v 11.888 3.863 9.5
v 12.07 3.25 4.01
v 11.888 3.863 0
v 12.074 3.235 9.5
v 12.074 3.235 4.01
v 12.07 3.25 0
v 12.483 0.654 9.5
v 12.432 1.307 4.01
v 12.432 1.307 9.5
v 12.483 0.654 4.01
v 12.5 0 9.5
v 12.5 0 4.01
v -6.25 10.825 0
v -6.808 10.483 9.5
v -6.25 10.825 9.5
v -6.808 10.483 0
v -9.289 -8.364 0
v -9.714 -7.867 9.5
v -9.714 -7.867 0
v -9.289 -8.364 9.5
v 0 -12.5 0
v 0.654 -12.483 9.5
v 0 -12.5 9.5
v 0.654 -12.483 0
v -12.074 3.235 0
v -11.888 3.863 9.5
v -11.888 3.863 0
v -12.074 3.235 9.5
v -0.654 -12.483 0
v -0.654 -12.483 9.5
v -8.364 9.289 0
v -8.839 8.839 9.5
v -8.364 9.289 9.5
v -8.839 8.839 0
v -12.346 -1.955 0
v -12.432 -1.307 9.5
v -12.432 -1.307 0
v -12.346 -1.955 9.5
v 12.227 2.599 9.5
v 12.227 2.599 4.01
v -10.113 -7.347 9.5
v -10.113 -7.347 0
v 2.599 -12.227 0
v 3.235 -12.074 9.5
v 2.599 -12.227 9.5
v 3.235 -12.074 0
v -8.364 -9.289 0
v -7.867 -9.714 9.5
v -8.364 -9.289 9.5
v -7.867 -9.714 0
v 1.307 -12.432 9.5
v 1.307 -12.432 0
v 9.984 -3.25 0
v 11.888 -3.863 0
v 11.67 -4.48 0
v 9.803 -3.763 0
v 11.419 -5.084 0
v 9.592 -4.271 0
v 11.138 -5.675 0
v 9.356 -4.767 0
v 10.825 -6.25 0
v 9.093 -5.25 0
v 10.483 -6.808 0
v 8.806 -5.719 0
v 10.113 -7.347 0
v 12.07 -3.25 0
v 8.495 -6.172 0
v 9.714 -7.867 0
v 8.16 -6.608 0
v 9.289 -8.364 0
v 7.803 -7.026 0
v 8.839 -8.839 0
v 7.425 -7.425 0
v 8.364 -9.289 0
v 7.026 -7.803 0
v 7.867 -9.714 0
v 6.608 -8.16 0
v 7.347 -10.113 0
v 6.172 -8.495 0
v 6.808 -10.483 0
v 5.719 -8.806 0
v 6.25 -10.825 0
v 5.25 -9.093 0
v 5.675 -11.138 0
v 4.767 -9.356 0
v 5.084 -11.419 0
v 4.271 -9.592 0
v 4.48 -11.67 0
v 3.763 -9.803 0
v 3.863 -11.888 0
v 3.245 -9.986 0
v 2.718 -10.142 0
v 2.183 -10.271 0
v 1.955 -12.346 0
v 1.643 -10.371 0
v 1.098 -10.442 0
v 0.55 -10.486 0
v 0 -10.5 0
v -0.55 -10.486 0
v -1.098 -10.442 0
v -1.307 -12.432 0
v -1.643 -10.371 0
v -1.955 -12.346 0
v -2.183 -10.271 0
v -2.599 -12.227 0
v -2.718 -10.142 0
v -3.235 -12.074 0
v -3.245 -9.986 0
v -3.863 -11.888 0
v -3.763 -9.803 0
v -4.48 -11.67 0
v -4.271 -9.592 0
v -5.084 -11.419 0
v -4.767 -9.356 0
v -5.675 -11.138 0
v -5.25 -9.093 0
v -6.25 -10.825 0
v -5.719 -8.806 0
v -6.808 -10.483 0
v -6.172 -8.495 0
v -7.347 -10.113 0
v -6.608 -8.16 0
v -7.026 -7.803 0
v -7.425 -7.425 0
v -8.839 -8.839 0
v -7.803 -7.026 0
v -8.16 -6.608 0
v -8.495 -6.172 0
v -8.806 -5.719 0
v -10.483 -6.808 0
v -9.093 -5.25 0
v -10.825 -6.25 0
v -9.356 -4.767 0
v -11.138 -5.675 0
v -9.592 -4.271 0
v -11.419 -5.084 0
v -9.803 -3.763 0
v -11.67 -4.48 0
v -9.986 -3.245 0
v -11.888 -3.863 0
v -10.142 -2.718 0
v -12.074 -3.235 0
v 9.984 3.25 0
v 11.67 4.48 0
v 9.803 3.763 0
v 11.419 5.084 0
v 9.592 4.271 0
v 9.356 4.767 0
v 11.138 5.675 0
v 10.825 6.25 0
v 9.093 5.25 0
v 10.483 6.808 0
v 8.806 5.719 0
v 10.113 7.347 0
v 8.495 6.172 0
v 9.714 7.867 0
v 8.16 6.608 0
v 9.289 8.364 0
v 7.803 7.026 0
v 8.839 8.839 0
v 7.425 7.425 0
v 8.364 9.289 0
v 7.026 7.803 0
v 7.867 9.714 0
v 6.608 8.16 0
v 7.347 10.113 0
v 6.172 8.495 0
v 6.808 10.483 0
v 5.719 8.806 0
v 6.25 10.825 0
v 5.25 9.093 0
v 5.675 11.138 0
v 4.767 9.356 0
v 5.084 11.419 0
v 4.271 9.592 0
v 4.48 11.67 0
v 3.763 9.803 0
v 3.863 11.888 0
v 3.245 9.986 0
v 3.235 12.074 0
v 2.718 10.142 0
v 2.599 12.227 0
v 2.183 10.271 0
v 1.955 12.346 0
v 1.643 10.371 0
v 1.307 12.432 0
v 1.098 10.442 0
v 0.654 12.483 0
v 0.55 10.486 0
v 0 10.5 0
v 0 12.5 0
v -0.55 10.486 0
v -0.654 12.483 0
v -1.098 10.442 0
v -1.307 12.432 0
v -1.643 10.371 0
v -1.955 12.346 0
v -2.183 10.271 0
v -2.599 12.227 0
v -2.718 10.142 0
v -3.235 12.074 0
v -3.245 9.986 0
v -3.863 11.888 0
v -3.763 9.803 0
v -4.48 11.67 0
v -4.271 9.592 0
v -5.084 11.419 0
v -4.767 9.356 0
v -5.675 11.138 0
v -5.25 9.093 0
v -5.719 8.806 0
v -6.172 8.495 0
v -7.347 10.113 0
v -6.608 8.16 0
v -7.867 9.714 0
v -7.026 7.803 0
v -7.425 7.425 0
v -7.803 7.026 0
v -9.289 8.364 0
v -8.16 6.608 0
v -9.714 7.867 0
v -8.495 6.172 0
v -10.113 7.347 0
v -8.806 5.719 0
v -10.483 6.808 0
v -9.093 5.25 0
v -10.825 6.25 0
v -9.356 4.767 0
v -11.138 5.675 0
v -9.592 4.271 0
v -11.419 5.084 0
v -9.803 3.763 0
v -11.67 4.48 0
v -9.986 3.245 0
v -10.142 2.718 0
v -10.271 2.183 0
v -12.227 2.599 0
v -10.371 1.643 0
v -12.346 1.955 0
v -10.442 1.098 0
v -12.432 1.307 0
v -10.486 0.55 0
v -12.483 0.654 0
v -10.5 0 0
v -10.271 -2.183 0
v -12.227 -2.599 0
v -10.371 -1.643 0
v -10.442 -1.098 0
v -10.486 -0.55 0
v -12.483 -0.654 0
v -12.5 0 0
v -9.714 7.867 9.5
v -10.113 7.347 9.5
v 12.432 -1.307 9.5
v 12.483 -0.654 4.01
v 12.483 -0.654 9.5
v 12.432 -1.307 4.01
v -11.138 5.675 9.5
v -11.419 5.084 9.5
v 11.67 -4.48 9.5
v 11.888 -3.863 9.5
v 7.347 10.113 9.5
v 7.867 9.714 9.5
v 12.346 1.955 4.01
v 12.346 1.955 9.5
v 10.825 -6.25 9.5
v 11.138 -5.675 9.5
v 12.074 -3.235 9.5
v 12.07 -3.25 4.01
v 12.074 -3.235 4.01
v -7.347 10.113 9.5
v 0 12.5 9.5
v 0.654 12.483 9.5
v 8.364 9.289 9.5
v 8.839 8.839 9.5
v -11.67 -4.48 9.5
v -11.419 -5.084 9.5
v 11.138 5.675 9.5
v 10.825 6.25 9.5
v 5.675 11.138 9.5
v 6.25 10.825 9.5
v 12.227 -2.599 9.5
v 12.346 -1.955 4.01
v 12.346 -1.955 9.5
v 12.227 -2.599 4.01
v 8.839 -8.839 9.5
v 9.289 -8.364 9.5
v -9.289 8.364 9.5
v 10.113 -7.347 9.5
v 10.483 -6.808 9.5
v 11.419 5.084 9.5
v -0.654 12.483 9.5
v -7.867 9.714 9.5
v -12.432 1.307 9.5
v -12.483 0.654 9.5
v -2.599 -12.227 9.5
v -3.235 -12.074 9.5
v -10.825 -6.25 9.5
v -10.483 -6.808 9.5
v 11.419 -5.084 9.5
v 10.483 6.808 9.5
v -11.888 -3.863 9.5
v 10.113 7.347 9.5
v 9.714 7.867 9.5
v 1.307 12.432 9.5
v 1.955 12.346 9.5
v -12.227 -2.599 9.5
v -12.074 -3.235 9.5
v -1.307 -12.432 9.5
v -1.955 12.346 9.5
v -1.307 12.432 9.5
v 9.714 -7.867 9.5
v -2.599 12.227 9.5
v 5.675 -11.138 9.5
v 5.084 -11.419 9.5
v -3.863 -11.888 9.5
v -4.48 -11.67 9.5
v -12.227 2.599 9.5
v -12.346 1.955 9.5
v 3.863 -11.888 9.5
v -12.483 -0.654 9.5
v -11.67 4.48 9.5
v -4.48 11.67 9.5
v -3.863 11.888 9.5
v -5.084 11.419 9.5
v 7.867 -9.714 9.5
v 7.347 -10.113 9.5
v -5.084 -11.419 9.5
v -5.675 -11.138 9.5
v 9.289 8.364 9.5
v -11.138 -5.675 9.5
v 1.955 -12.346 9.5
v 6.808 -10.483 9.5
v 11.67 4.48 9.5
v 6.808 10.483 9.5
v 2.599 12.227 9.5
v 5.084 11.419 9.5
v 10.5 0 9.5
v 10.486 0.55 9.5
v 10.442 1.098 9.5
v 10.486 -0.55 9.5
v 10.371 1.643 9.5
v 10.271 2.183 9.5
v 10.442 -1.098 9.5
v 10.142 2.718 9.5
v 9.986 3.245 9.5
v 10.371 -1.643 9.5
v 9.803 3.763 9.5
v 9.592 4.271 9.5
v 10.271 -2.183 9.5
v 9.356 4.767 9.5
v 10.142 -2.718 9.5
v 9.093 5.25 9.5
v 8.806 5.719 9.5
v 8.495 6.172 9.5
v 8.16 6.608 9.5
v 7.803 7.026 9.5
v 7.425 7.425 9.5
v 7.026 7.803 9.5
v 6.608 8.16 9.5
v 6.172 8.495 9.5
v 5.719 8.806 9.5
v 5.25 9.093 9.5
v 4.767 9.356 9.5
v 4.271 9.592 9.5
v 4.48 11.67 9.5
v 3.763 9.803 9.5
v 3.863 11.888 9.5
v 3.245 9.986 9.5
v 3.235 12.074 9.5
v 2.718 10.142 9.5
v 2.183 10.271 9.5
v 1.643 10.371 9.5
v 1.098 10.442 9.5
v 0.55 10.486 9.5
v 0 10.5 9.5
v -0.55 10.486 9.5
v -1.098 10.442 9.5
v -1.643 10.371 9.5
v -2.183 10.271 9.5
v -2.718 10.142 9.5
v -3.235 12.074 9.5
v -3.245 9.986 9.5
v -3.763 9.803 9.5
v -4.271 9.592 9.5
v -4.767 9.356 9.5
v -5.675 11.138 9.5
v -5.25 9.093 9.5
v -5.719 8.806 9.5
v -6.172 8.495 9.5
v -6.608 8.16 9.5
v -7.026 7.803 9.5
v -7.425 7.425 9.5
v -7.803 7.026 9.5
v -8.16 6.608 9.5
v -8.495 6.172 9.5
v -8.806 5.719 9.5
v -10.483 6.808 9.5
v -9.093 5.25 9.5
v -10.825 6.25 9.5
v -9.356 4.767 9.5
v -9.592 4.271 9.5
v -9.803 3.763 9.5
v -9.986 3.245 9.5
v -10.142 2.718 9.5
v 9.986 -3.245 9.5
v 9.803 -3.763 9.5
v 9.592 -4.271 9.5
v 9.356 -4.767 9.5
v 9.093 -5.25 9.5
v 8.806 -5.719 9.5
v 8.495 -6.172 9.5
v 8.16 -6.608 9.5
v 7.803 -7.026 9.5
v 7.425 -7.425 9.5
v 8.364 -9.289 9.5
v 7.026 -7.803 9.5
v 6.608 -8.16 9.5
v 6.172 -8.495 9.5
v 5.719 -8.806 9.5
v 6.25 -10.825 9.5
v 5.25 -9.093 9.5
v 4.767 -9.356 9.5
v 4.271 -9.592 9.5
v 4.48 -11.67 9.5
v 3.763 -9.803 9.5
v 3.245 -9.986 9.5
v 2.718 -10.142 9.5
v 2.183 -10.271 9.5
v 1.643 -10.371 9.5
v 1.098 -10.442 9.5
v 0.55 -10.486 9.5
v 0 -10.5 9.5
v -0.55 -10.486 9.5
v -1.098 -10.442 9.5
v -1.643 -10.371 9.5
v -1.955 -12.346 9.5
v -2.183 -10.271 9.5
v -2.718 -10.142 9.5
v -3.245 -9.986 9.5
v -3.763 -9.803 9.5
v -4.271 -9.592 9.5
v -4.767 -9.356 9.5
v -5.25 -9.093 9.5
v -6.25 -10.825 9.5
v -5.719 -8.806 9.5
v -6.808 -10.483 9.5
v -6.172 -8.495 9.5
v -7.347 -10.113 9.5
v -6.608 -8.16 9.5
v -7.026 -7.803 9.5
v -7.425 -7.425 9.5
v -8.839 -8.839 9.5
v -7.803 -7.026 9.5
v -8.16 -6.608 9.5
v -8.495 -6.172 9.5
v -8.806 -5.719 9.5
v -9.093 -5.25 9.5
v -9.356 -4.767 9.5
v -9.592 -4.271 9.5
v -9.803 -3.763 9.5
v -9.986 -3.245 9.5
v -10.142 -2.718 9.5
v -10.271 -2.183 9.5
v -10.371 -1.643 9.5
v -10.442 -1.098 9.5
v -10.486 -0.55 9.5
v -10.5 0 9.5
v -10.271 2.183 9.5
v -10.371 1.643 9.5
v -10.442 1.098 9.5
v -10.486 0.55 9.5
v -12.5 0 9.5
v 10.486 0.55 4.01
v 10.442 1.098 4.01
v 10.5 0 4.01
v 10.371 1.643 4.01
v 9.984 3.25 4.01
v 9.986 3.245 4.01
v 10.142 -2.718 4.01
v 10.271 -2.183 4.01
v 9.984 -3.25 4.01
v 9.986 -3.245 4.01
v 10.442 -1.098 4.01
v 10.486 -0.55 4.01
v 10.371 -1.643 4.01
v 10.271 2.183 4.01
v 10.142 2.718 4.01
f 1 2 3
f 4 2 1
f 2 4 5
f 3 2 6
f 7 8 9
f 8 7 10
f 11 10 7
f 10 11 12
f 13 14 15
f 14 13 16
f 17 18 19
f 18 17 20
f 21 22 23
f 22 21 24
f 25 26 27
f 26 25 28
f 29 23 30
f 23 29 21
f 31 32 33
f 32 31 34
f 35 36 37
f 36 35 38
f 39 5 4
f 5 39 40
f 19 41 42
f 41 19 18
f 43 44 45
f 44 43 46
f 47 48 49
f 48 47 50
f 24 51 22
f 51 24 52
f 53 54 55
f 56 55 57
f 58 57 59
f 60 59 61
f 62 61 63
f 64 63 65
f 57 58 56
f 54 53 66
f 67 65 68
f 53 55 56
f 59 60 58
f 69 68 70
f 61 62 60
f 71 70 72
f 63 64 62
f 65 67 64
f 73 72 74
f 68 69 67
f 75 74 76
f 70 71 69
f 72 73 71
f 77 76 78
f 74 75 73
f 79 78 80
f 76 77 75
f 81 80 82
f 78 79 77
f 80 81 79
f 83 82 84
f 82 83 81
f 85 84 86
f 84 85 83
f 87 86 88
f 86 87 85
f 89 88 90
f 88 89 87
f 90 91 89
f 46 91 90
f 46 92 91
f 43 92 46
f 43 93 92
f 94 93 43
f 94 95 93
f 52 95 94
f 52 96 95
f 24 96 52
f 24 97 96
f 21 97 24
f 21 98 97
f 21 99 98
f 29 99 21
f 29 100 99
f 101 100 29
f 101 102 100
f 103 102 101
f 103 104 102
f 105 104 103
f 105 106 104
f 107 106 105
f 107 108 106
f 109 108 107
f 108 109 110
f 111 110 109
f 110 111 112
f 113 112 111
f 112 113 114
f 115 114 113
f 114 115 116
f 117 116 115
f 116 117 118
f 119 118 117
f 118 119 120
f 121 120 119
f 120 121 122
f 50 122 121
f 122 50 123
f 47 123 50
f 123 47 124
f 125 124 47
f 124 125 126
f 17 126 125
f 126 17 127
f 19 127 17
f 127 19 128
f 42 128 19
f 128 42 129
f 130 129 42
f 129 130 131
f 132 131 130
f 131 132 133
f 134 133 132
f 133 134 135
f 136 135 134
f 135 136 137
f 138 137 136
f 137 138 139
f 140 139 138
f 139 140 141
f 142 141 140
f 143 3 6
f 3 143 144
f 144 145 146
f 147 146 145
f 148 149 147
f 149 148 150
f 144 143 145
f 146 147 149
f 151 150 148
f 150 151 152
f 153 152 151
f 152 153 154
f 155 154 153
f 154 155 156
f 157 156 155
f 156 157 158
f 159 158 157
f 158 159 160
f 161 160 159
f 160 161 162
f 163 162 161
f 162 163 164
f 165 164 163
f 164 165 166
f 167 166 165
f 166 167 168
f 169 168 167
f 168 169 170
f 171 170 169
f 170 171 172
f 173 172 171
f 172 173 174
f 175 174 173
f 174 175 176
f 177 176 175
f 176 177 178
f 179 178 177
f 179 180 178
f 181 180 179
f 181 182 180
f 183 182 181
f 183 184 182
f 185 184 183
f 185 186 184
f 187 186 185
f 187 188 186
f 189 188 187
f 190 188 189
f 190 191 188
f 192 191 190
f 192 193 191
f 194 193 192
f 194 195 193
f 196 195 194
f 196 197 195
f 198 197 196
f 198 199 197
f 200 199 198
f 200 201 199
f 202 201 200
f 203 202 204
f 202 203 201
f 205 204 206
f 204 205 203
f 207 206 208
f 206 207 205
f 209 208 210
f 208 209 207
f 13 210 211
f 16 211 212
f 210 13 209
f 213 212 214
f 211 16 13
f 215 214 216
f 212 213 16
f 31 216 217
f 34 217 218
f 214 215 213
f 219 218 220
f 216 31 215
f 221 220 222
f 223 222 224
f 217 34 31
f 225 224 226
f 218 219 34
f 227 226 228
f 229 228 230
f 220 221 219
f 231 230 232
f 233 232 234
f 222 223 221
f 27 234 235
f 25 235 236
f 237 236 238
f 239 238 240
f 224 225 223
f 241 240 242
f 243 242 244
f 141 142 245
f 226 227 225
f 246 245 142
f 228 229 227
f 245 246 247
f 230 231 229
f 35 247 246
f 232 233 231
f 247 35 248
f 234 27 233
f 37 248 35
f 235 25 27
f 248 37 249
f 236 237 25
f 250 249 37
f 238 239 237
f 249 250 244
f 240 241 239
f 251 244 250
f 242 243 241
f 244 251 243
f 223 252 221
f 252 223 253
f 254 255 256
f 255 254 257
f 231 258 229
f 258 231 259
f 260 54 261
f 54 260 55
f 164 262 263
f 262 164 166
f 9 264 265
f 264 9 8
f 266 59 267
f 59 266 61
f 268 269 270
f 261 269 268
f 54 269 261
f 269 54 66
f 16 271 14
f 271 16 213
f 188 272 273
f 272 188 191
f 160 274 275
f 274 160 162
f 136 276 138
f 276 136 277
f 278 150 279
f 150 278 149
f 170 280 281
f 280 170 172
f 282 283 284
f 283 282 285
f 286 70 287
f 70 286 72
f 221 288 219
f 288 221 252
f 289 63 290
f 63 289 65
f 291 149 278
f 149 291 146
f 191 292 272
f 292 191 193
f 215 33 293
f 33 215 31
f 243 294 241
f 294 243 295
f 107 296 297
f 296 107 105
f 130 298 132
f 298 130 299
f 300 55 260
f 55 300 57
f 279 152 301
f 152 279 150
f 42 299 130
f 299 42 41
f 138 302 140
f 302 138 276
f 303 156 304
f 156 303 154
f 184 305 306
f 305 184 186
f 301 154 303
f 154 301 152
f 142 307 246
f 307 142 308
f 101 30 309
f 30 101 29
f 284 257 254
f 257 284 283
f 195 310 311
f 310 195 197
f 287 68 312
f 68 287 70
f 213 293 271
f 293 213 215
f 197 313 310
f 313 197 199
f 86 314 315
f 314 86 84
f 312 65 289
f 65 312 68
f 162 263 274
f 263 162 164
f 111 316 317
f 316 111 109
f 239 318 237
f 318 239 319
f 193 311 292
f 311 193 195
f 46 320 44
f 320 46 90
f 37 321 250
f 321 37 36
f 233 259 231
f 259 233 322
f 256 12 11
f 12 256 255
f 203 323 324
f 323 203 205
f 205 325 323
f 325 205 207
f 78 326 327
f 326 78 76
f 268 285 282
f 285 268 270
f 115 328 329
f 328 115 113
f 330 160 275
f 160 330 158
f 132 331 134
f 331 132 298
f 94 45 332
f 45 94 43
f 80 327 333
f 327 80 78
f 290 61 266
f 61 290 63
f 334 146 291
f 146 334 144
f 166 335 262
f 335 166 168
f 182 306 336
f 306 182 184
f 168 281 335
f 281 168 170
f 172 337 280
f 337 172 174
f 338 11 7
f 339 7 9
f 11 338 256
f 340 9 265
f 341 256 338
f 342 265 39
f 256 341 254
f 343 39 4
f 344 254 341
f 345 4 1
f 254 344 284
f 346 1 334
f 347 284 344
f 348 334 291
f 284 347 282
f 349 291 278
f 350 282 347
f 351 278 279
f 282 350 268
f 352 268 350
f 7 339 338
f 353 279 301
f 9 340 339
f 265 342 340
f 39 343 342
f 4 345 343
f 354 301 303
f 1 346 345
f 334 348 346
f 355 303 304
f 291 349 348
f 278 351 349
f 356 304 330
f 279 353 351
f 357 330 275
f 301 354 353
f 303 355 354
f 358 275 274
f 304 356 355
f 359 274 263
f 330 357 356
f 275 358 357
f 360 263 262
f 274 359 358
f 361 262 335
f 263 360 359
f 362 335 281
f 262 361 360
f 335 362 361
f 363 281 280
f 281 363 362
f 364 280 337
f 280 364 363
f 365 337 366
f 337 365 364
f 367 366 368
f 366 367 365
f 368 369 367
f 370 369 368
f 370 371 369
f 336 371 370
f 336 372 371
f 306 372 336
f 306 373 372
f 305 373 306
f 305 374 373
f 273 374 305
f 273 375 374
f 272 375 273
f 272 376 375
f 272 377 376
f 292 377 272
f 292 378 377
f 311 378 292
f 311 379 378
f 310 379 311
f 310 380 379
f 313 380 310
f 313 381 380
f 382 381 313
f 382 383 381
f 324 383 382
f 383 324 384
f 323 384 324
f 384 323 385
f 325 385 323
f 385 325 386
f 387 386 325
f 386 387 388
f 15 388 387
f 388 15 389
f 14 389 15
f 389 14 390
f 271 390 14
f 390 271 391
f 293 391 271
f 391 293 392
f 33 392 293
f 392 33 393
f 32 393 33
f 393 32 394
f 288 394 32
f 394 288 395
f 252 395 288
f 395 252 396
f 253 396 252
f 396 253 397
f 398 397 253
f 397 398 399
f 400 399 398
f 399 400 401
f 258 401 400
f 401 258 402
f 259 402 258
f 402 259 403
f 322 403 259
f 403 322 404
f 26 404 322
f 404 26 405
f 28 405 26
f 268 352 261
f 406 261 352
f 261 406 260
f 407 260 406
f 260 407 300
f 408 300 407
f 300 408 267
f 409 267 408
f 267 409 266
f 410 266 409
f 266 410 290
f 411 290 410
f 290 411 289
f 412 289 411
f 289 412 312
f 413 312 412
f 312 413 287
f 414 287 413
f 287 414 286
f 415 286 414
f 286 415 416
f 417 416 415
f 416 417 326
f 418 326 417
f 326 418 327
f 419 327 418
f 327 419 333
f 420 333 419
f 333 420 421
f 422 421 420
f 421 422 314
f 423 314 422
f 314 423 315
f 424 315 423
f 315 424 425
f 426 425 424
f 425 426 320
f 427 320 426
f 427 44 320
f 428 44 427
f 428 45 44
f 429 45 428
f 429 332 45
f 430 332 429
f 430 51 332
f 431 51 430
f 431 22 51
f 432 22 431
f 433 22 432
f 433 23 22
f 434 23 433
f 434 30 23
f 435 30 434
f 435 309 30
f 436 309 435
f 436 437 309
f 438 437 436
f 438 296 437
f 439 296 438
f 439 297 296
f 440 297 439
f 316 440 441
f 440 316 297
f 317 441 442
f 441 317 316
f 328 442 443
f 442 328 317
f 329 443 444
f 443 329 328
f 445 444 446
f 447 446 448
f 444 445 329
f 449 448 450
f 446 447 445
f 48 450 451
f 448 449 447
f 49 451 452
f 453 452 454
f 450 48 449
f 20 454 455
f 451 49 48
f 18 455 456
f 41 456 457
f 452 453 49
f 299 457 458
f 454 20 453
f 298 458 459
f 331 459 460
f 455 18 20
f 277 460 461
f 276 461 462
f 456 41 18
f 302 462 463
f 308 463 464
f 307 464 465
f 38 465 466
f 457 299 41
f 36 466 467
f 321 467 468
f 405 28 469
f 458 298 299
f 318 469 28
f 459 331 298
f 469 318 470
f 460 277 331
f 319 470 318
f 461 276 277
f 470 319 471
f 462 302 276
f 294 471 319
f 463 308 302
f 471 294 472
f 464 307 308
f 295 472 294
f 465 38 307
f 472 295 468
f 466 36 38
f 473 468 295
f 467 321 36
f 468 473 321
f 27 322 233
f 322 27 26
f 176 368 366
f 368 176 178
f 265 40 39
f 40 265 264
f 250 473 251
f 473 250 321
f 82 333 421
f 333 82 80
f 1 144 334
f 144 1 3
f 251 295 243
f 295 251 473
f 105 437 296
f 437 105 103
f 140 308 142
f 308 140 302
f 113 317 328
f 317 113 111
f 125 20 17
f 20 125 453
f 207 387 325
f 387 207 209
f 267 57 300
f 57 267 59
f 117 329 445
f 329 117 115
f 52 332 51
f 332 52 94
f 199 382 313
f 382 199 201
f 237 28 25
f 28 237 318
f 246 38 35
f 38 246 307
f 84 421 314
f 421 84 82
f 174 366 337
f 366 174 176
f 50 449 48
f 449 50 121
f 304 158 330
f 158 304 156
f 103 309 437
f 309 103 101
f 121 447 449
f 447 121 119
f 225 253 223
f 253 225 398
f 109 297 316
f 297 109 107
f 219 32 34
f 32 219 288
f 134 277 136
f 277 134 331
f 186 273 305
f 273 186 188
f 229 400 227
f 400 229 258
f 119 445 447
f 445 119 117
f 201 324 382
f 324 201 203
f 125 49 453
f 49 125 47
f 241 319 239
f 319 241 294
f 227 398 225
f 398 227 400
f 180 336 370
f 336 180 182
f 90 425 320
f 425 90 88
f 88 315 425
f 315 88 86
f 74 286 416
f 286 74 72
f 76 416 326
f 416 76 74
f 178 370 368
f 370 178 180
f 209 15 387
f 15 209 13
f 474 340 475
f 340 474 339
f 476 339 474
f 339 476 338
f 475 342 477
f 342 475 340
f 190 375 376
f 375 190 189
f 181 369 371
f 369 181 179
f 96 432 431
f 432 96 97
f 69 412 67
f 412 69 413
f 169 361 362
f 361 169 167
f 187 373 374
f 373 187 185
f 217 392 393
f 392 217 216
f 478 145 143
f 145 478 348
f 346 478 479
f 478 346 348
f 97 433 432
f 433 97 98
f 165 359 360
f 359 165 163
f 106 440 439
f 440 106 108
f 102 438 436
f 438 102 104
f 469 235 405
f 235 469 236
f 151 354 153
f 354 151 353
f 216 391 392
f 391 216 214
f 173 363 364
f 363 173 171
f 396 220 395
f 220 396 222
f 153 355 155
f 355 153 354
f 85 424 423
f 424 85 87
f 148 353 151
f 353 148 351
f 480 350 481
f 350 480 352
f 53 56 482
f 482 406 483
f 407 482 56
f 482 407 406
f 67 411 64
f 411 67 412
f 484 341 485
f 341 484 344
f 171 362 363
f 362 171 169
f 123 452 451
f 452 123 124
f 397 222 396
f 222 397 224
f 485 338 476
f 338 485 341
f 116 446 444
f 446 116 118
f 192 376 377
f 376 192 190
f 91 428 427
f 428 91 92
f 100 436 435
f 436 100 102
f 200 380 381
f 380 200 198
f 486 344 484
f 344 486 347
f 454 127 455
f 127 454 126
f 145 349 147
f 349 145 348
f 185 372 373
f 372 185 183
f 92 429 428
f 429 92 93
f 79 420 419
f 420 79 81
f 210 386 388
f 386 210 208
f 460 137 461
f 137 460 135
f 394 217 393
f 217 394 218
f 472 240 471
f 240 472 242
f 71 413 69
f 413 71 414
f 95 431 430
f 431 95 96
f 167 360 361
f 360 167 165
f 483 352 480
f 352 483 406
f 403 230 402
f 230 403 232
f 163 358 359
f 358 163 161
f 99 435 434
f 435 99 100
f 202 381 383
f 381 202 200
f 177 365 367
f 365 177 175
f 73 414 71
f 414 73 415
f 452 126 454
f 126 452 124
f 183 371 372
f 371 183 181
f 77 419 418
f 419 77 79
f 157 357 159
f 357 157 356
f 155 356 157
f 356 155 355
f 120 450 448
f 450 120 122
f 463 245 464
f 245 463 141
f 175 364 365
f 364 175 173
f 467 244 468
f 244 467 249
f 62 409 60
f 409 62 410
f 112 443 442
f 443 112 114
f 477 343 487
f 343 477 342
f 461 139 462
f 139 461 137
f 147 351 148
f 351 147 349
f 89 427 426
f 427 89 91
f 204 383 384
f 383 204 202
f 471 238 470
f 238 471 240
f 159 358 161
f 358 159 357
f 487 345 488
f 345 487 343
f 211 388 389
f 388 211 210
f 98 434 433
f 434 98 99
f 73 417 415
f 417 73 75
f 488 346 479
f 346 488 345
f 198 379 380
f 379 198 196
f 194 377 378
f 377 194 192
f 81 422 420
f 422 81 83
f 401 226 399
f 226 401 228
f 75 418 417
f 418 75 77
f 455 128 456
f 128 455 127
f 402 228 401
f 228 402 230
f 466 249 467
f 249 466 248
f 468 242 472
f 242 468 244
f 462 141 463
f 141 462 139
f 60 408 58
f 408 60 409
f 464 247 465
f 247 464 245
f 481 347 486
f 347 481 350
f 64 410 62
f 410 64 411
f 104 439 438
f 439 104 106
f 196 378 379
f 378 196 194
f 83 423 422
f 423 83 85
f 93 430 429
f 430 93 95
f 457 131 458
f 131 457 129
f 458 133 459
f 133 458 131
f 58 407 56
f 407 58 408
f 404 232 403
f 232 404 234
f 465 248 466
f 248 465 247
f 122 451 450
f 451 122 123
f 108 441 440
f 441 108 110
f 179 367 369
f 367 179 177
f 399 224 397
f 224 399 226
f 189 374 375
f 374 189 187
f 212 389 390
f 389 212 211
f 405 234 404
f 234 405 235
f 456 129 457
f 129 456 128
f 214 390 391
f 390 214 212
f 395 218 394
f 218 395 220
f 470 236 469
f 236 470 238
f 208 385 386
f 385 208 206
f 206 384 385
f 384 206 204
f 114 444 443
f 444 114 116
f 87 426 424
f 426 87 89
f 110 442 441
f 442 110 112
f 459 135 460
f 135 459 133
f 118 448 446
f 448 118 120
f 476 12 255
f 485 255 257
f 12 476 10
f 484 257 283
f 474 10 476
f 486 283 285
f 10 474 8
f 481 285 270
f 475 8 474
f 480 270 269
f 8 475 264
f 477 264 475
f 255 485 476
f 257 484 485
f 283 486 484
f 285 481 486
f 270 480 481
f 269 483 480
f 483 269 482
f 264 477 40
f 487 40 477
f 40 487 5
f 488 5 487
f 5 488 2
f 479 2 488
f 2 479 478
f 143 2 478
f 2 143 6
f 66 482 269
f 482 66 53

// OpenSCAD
// file: model.scad
// Lux sensor capsule on the top of a 38.1 mm tube. Axis = tube axis, z up, z = 0 is the tube's top face.
// Three printed parts: base (plate + three zip-tie fingers down the tube), riser (ring the board sits on), cap (glass seat over the board).
// The VEML7700 lies under a PTFE disc and the cabochon; cat5 pairs go on a 2.54 mm screw terminal under the board. No extender board.
view = "closed";    // closed | section | cap_print | riser_print | base_print
exit = "center";    // center: cable down the hollow tube | side: cable out through a notch in the cap wall, +x
tube_od = 38.1; R_t = tube_od/2;
head_d = 34; bore_d = 25.2;          // head = glass + 4.4 mm wall
plate_t = 3;
// Window: same stack as lux-sensor-mount
cab_d = 24.8; cab_h = 6;             // owner's cabochon, measured
ptfe_t = 1;  capture = 1.5; seat_gap = 0.15; bevel = 30;
lux = [16.51, 16.51, 1.6];           // Adafruit VEML7700 4162, Eagle .brd
term = [12.7, 6, 7.5];               // 5-position 2.54 mm screw terminal under the board: a guess, not bought
riser_h = 9.5;                       // terminal 7.5 + 2 for wire ends
riser_od = 25; riser_id = 21;        // board corners (diag 23.3) rest on the ring
gap = 0.8;                           // board top to PTFE
screw_r = 14.8; screw_d = 1.8;       // two M2 self-tapping at +-y
tabs = [0, 120, 240]; tab_t = 3; tab_arc = 30; fh = 14; tie_z = -6.5;
slot_w = 6.5; slot_z = 4;
cap_z = plate_t;                     // cap and riser start on the plate
z_board = cap_z + riser_h; z_ptfe = z_board + lux[2] + gap; z_g = z_ptfe + ptfe_t;
cab_R = (pow(cab_d/2, 2) + cab_h*cab_h)/(2*cab_h); lip_r = cab_d/2 - capture;
lip_h = sqrt(cab_R*cab_R - lip_r*lip_r) - (cab_R - cab_h);
cap_top = z_g + lip_h + 1.2;
echo(overall = cap_top, dome_above_cap = z_g + cab_h - cap_top);
$fn = 120;
module glass(o = 0) translate([0, 0, z_g - (cab_R - cab_h)]) intersection() { sphere(r = cab_R + o); translate([-50, -50, cab_R - cab_h]) cube(100); }
module base() difference() {
  union() {
    cylinder(d = head_d, h = plate_t);
    for (a = tabs) rotate(a - tab_arc/2) rotate_extrude(angle = tab_arc) {
      square([R_t + 0.25 + tab_t, plate_t]);
      translate([R_t + 0.25, -fh]) square([tab_t, fh + plate_t]);
    }
  }
  translate([0, 0, tie_z - 1.7]) difference() { cylinder(d = 2*(R_t + 0.25 + tab_t) + 2, h = 3.4); translate([0, 0, -1]) cylinder(d = 2*(R_t + 0.25 + tab_t - 1.2), h = 6); }
  if (exit == "center") translate([0, 0, -1]) cylinder(d = 7, h = plate_t + 2);
  for (s = [-1, 1]) translate([0, s*screw_r, -1]) { cylinder(d = 2.4, h = plate_t + 2); cylinder(d = 4.2, h = 1 + 1.6); }
}
module riser() translate([0, 0, cap_z]) difference() {
  cylinder(d = riser_od, h = riser_h);
  translate([0, 0, -1]) cylinder(d = riser_id, h = riser_h + 2);
  if (exit == "side") translate([riser_od/2 - 3, -slot_w/2, -1]) cube([6, slot_w, slot_z + 1 + 0.01]);
}
module cap() difference() {
  translate([0, 0, cap_z]) cylinder(d = head_d, h = cap_top - cap_z);
  translate([0, 0, cap_z - 1]) cylinder(d = bore_d, h = z_g - cap_z + 1);
  glass(seat_gap);
  translate([0, 0, z_g + lip_h + 0.4]) cylinder(h = 20, r1 = lip_r, r2 = lip_r + 20/tan(bevel));
  for (s = [-1, 1]) translate([0, s*screw_r, cap_z - 1]) cylinder(d = screw_d, h = 9);
  if (exit == "side") hull() { translate([0, 0, cap_z + slot_z]) rotate([0, 90, 0]) cylinder(d = slot_w, h = 30); translate([0, -slot_w/2, cap_z - 1]) cube([30, slot_w, 1]); }
}
module parts() {
  color("SteelBlue") base(); color("LightSteelBlue") riser(); color("CadetBlue") cap();
  color("LightCyan", 0.6) glass(); color("white") translate([0, 0, z_ptfe]) cylinder(d = bore_d - 0.6, h = ptfe_t);
  color("green") translate([-lux[0]/2, -lux[1]/2, z_board]) cube(lux);
  color("Crimson") translate([-term[0]/2, 2 - term[1]/2, z_board - term[2]]) cube(term);
}
module tube() color("silver", 0.3) translate([0, 0, -60]) difference() { cylinder(d = tube_od, h = 60); translate([0, 0, -1]) cylinder(d = tube_od - 6, h = 62); }
if (view == "cap_print") translate([0, 0, -cap_z]) cap();
if (view == "riser_print") translate([0, 0, -cap_z]) riser();
if (view == "base_print") translate([0, 0, plate_t]) mirror([0, 0, 1]) base();   // plate top on the bed, fingers up
if (view == "closed") { parts(); tube(); }
if (view == "section") intersection() { union() { parts(); tube(); } translate([-100, -100, -100]) cube([200, 100, 300]); }
// main file
// riser-side print. Prints as shown.
include <model.scad>
view = "riser_print";
exit = "side";
